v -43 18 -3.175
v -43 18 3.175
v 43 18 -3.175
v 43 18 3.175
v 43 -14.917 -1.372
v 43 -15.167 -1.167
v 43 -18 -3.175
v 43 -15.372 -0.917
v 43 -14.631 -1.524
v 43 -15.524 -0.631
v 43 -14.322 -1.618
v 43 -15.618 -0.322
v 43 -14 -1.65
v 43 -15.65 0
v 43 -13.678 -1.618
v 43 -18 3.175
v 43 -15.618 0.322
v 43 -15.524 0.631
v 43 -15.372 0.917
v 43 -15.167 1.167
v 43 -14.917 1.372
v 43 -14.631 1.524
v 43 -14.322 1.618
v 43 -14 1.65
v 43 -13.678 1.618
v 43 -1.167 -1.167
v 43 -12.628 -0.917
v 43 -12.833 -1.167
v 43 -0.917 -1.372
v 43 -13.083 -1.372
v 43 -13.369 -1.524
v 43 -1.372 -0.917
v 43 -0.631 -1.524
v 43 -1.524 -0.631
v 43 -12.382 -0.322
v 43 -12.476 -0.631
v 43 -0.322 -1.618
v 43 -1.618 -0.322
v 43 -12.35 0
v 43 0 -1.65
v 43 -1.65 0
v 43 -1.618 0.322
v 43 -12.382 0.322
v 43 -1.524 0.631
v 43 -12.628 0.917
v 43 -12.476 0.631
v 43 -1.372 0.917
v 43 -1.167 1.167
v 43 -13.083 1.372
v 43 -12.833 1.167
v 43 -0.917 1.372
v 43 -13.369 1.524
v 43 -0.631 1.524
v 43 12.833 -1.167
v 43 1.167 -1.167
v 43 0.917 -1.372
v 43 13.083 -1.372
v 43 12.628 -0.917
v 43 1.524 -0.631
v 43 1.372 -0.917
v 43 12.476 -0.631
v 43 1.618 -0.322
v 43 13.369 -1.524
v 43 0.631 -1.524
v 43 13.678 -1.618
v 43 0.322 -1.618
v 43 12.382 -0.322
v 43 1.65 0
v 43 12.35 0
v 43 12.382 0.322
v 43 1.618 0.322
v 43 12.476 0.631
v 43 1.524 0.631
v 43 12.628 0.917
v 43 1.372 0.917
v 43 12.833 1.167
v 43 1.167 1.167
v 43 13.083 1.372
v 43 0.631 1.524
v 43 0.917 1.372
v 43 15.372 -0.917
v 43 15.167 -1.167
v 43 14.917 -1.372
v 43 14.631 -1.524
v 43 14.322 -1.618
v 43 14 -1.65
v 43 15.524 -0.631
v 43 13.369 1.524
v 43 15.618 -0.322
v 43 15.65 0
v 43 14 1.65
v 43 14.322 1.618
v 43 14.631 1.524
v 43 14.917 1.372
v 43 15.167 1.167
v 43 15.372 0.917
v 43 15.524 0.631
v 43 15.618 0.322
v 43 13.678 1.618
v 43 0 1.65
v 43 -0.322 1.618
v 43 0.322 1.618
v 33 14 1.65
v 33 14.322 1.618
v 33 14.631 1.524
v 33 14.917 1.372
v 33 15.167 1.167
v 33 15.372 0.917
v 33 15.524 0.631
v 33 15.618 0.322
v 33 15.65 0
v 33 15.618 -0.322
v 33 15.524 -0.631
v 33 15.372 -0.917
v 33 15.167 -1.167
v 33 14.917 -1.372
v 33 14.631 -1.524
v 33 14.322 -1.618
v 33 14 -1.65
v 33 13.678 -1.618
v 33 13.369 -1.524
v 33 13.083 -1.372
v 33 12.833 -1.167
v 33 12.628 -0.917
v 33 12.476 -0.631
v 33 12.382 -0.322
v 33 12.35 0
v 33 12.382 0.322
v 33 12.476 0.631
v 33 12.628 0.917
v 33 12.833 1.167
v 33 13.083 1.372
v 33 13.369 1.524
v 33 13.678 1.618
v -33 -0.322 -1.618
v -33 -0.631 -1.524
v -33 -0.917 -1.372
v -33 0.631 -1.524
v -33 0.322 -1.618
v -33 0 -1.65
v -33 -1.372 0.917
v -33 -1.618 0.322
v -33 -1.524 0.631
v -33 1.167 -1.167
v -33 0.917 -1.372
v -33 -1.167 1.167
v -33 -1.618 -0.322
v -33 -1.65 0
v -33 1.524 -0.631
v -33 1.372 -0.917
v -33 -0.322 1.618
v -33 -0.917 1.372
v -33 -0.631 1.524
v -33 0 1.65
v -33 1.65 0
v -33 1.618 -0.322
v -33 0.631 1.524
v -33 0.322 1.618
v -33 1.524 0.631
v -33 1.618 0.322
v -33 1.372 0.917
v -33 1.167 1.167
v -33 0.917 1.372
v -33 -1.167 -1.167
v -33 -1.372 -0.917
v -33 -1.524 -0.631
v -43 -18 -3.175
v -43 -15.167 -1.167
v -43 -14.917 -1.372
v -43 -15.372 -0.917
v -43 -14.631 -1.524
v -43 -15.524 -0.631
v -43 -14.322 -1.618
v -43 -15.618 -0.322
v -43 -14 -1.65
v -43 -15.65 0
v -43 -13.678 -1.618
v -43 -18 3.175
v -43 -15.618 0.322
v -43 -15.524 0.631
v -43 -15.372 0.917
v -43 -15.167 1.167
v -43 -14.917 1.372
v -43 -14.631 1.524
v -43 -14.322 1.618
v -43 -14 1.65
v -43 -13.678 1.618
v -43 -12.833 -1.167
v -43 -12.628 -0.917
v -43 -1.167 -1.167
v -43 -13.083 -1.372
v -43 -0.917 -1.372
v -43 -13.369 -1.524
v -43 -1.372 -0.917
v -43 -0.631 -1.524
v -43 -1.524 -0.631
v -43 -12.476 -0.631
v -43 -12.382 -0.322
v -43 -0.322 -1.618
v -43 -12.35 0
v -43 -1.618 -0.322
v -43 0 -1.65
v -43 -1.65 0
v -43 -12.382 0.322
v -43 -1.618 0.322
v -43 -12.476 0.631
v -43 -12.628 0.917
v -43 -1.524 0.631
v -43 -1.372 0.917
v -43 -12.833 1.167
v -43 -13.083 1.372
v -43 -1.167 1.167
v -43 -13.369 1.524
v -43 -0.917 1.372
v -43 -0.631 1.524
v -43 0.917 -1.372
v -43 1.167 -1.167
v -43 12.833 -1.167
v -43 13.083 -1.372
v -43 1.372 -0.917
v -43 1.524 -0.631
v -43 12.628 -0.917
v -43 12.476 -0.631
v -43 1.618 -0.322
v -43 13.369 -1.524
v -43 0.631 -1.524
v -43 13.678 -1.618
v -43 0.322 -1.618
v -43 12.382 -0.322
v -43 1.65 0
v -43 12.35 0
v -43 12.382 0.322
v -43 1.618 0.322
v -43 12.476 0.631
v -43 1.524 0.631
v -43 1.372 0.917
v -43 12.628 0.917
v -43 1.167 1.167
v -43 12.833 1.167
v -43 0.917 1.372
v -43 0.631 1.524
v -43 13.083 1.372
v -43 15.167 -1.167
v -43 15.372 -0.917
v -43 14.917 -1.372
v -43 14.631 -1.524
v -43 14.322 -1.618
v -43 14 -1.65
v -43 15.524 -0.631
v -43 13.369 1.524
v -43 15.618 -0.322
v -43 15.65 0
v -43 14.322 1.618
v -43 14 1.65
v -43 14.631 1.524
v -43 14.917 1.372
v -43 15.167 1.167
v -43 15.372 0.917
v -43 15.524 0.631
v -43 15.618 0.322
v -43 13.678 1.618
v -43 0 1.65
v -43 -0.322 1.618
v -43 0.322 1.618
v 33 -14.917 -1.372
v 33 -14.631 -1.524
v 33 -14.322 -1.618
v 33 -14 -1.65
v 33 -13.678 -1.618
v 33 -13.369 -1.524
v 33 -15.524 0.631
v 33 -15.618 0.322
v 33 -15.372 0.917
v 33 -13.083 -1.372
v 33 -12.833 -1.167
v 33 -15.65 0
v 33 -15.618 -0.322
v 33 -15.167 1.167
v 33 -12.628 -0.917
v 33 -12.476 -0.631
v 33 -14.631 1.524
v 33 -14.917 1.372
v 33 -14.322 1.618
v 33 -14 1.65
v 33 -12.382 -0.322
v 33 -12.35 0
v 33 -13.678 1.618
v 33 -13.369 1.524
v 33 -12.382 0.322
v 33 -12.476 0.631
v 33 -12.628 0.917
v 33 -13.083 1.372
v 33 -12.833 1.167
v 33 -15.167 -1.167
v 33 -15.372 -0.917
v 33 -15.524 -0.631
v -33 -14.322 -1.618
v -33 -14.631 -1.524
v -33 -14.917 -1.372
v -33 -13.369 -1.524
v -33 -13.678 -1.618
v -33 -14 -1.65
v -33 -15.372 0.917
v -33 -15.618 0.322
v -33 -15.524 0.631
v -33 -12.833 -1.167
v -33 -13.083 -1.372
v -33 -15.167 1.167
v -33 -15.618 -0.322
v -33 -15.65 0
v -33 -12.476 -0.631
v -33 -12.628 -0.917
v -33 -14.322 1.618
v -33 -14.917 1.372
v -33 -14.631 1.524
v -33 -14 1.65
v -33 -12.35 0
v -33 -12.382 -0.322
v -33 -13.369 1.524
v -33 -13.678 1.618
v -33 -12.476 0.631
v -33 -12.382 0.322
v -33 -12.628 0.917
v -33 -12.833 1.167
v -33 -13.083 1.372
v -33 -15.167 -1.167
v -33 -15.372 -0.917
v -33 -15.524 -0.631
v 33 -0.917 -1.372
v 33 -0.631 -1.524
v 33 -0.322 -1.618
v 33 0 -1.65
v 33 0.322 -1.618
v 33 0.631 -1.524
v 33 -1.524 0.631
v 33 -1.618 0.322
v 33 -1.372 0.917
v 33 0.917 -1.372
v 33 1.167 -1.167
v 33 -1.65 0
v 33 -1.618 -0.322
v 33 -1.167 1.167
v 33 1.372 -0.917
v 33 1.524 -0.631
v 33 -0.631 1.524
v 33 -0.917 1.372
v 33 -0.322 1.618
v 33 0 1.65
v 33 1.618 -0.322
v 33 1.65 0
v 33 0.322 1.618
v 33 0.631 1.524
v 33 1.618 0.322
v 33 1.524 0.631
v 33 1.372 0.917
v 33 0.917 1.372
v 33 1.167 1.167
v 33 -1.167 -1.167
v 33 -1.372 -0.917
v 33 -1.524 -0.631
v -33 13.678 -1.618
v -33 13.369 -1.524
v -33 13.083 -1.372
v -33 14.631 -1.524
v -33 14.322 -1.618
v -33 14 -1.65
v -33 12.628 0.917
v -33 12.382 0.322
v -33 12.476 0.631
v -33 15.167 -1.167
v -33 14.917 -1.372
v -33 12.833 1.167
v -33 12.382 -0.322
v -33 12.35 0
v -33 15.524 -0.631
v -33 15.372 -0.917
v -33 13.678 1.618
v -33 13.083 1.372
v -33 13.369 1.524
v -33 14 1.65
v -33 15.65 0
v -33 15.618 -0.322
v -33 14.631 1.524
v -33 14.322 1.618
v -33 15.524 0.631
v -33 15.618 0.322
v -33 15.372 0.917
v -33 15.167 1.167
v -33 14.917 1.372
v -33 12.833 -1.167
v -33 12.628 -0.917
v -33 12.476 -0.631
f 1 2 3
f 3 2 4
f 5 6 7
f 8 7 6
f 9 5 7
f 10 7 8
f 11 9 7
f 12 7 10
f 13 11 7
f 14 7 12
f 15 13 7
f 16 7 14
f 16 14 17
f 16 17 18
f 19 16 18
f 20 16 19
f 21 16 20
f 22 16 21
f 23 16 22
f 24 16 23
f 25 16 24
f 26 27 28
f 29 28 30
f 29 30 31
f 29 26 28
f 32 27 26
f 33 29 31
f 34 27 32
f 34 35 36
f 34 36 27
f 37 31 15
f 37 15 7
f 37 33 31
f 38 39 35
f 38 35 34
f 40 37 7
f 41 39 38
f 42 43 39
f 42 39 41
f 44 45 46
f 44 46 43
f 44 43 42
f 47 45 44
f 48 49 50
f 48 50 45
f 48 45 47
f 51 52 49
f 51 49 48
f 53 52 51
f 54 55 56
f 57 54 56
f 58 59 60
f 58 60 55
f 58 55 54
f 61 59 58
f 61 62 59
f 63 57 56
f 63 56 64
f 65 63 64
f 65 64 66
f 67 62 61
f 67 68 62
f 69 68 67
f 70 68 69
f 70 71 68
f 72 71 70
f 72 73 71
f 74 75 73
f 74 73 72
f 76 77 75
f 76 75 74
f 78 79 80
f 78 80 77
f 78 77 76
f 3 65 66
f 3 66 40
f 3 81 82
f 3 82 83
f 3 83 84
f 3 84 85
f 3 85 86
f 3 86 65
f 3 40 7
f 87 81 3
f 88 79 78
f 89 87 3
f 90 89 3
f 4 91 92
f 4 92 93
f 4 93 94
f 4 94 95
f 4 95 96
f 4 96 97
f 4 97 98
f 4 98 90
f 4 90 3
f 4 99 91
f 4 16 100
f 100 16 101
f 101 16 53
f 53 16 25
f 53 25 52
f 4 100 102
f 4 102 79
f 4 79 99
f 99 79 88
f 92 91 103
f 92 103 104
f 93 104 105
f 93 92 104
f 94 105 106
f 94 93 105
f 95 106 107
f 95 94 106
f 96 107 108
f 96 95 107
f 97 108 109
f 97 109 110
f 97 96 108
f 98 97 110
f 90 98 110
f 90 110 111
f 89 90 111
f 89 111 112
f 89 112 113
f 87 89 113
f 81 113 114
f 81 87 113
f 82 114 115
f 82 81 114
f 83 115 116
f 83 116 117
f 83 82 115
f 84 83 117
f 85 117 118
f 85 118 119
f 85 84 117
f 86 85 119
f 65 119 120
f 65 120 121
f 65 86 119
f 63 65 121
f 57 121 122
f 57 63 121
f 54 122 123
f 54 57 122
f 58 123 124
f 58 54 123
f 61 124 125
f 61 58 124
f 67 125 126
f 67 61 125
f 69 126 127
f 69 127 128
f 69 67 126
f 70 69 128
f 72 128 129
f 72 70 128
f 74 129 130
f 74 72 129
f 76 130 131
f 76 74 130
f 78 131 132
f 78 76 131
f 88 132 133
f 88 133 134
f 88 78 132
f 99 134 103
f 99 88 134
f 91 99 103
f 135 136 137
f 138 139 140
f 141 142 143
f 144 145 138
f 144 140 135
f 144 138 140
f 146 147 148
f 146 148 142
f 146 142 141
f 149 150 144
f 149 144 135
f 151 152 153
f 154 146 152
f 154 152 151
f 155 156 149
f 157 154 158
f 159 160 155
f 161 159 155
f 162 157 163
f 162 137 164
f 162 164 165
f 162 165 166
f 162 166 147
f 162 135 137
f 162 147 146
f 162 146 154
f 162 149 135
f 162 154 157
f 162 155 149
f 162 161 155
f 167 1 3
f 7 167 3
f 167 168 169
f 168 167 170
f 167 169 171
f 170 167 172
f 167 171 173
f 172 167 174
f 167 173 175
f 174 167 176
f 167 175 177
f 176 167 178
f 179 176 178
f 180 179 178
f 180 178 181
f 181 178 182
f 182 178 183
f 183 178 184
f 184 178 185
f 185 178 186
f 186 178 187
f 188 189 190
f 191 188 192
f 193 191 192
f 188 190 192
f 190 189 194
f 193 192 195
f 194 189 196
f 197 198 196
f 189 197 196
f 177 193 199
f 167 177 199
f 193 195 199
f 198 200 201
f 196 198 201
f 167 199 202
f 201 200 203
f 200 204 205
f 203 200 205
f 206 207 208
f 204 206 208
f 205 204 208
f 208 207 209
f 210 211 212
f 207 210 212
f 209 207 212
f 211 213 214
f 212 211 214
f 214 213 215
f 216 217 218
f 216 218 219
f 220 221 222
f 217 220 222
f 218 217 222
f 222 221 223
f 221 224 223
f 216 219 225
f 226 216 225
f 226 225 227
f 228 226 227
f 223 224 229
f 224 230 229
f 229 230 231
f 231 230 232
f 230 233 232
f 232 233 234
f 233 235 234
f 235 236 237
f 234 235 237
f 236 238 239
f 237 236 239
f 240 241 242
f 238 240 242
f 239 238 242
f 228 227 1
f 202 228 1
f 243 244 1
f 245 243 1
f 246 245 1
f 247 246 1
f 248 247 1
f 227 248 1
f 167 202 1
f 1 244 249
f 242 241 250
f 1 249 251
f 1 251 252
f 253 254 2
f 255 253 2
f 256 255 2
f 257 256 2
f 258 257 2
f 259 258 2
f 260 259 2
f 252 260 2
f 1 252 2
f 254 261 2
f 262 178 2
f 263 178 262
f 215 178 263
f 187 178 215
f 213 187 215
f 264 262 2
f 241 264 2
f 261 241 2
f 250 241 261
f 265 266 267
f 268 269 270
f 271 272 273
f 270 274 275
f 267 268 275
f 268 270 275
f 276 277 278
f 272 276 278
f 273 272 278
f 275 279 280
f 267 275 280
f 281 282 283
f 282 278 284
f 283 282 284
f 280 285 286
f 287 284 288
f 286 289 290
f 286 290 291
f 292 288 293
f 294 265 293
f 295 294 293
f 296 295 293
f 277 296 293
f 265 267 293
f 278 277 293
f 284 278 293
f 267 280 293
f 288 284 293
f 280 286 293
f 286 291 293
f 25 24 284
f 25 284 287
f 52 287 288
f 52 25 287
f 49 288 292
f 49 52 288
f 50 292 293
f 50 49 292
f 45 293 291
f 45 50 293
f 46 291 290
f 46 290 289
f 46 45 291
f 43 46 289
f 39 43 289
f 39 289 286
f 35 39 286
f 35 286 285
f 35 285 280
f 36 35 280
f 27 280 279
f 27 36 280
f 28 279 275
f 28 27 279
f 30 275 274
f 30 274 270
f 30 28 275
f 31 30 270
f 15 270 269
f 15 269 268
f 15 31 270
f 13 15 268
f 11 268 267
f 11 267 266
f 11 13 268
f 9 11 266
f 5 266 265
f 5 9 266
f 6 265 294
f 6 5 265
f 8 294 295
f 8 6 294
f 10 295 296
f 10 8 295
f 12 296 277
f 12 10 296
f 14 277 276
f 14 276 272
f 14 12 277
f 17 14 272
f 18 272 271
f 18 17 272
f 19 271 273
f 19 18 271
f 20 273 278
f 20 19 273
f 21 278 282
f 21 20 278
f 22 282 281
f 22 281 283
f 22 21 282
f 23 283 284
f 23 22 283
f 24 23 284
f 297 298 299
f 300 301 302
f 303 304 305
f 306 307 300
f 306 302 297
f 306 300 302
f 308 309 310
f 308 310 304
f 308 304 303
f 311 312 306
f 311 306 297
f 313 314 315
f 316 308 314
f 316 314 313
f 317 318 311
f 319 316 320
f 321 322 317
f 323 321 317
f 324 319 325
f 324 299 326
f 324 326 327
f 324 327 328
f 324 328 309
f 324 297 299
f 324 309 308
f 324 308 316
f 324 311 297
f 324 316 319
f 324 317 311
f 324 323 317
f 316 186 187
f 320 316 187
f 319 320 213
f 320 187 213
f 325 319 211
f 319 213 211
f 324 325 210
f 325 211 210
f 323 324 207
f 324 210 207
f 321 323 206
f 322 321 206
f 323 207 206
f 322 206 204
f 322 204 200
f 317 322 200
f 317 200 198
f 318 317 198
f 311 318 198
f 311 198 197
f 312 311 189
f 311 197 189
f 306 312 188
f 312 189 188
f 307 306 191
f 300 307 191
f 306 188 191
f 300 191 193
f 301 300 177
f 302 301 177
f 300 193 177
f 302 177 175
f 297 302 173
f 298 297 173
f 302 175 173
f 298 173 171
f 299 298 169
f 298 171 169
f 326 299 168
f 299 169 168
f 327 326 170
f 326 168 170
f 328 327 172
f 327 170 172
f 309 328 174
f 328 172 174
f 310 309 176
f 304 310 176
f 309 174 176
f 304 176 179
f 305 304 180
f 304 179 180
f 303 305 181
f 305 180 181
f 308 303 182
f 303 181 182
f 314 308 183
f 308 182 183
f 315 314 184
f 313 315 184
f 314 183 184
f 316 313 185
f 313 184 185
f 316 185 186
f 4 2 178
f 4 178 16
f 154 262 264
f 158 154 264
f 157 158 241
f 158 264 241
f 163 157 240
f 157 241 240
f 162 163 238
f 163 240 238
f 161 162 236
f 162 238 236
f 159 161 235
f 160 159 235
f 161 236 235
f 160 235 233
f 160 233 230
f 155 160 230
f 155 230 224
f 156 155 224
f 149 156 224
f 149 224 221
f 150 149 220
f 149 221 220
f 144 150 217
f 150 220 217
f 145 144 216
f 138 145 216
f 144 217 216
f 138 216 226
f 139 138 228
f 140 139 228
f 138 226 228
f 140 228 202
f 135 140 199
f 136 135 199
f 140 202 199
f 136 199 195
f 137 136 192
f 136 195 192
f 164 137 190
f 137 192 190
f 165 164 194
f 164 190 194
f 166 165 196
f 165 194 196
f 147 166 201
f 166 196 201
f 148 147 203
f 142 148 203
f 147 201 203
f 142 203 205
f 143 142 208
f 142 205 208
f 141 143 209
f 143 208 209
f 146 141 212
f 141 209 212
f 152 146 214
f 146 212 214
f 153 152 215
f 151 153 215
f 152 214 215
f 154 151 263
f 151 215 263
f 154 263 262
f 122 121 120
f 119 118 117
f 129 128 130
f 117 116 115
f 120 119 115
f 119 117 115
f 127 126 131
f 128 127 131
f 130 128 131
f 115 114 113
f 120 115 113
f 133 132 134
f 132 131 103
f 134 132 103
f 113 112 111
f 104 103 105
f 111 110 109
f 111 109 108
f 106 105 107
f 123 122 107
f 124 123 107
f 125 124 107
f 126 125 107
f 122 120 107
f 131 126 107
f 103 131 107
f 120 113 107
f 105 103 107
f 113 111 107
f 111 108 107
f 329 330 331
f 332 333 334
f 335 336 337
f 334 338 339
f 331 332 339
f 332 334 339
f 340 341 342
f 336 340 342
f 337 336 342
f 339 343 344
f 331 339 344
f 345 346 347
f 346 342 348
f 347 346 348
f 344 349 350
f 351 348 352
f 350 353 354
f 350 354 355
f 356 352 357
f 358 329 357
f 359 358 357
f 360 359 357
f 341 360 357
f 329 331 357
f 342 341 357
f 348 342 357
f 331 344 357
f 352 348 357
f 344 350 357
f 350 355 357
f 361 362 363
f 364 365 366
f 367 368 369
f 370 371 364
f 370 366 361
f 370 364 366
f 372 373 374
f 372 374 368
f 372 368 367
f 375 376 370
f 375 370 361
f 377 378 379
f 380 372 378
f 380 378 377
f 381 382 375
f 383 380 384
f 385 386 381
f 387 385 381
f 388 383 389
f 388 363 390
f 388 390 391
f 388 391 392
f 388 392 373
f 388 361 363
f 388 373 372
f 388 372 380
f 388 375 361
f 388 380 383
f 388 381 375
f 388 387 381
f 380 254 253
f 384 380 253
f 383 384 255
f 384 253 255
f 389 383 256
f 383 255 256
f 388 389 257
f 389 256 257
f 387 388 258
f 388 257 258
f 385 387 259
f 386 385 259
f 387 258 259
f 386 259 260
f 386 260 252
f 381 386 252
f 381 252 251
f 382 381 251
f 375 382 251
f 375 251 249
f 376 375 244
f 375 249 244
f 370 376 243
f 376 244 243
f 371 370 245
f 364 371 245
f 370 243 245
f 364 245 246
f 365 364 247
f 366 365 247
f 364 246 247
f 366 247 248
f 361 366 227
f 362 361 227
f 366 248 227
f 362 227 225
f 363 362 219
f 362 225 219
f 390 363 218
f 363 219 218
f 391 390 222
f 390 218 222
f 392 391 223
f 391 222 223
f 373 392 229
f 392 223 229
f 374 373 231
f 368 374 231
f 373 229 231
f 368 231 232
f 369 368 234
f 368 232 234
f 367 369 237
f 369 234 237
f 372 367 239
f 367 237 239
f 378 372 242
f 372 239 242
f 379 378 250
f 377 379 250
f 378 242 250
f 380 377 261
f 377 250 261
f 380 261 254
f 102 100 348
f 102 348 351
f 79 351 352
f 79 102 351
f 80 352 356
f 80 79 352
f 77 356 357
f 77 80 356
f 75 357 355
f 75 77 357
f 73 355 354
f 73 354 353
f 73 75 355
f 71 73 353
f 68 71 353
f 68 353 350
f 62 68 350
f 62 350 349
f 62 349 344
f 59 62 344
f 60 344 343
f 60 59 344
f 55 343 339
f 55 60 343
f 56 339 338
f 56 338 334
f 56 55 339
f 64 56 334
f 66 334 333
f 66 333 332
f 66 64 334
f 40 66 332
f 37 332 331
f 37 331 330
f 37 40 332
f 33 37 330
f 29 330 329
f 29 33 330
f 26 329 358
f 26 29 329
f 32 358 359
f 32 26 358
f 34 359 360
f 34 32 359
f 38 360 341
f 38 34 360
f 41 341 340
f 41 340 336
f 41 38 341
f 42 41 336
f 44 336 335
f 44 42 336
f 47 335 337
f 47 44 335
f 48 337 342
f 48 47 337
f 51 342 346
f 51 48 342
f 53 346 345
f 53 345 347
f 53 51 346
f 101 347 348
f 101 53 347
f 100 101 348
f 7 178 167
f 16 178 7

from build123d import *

# Parameters (mm, degrees)
SKETCH1_W           = 86
SKETCH1_H           = 36
BOSS_EXTRUDE1_DEPTH = 3.175
SKETCH2_R           = 1.65
CUT_EXTRUDE1_DEPTH  = 10


with BuildPart() as part:
    # Sketch1 → Boss-Extrude1 (new, symmetric)
    with BuildSketch(Plane.XY):
        Rectangle(SKETCH1_W, SKETCH1_H)
    extrude(amount=BOSS_EXTRUDE1_DEPTH, both=True)

    # Sketch2 → Cut-Extrude1 (cut)
    with BuildSketch(Plane.ZY.offset(43)):
        with Locations((0, 14)):
            Circle(SKETCH2_R)
        with Locations((0, -14)):
            Circle(SKETCH2_R)
        Circle(SKETCH2_R)
    cut_extrude1 = extrude(amount=-CUT_EXTRUDE1_DEPTH, mode=Mode.SUBTRACT)

    # Mirror1: Cut-Extrude1 across plane
    add(cut_extrude1.mirror(Plane(origin=(0, 0, 0), x_dir=(0, 0, 1), z_dir=(1, 0, 0))), mode=Mode.SUBTRACT)


solid = part.part
